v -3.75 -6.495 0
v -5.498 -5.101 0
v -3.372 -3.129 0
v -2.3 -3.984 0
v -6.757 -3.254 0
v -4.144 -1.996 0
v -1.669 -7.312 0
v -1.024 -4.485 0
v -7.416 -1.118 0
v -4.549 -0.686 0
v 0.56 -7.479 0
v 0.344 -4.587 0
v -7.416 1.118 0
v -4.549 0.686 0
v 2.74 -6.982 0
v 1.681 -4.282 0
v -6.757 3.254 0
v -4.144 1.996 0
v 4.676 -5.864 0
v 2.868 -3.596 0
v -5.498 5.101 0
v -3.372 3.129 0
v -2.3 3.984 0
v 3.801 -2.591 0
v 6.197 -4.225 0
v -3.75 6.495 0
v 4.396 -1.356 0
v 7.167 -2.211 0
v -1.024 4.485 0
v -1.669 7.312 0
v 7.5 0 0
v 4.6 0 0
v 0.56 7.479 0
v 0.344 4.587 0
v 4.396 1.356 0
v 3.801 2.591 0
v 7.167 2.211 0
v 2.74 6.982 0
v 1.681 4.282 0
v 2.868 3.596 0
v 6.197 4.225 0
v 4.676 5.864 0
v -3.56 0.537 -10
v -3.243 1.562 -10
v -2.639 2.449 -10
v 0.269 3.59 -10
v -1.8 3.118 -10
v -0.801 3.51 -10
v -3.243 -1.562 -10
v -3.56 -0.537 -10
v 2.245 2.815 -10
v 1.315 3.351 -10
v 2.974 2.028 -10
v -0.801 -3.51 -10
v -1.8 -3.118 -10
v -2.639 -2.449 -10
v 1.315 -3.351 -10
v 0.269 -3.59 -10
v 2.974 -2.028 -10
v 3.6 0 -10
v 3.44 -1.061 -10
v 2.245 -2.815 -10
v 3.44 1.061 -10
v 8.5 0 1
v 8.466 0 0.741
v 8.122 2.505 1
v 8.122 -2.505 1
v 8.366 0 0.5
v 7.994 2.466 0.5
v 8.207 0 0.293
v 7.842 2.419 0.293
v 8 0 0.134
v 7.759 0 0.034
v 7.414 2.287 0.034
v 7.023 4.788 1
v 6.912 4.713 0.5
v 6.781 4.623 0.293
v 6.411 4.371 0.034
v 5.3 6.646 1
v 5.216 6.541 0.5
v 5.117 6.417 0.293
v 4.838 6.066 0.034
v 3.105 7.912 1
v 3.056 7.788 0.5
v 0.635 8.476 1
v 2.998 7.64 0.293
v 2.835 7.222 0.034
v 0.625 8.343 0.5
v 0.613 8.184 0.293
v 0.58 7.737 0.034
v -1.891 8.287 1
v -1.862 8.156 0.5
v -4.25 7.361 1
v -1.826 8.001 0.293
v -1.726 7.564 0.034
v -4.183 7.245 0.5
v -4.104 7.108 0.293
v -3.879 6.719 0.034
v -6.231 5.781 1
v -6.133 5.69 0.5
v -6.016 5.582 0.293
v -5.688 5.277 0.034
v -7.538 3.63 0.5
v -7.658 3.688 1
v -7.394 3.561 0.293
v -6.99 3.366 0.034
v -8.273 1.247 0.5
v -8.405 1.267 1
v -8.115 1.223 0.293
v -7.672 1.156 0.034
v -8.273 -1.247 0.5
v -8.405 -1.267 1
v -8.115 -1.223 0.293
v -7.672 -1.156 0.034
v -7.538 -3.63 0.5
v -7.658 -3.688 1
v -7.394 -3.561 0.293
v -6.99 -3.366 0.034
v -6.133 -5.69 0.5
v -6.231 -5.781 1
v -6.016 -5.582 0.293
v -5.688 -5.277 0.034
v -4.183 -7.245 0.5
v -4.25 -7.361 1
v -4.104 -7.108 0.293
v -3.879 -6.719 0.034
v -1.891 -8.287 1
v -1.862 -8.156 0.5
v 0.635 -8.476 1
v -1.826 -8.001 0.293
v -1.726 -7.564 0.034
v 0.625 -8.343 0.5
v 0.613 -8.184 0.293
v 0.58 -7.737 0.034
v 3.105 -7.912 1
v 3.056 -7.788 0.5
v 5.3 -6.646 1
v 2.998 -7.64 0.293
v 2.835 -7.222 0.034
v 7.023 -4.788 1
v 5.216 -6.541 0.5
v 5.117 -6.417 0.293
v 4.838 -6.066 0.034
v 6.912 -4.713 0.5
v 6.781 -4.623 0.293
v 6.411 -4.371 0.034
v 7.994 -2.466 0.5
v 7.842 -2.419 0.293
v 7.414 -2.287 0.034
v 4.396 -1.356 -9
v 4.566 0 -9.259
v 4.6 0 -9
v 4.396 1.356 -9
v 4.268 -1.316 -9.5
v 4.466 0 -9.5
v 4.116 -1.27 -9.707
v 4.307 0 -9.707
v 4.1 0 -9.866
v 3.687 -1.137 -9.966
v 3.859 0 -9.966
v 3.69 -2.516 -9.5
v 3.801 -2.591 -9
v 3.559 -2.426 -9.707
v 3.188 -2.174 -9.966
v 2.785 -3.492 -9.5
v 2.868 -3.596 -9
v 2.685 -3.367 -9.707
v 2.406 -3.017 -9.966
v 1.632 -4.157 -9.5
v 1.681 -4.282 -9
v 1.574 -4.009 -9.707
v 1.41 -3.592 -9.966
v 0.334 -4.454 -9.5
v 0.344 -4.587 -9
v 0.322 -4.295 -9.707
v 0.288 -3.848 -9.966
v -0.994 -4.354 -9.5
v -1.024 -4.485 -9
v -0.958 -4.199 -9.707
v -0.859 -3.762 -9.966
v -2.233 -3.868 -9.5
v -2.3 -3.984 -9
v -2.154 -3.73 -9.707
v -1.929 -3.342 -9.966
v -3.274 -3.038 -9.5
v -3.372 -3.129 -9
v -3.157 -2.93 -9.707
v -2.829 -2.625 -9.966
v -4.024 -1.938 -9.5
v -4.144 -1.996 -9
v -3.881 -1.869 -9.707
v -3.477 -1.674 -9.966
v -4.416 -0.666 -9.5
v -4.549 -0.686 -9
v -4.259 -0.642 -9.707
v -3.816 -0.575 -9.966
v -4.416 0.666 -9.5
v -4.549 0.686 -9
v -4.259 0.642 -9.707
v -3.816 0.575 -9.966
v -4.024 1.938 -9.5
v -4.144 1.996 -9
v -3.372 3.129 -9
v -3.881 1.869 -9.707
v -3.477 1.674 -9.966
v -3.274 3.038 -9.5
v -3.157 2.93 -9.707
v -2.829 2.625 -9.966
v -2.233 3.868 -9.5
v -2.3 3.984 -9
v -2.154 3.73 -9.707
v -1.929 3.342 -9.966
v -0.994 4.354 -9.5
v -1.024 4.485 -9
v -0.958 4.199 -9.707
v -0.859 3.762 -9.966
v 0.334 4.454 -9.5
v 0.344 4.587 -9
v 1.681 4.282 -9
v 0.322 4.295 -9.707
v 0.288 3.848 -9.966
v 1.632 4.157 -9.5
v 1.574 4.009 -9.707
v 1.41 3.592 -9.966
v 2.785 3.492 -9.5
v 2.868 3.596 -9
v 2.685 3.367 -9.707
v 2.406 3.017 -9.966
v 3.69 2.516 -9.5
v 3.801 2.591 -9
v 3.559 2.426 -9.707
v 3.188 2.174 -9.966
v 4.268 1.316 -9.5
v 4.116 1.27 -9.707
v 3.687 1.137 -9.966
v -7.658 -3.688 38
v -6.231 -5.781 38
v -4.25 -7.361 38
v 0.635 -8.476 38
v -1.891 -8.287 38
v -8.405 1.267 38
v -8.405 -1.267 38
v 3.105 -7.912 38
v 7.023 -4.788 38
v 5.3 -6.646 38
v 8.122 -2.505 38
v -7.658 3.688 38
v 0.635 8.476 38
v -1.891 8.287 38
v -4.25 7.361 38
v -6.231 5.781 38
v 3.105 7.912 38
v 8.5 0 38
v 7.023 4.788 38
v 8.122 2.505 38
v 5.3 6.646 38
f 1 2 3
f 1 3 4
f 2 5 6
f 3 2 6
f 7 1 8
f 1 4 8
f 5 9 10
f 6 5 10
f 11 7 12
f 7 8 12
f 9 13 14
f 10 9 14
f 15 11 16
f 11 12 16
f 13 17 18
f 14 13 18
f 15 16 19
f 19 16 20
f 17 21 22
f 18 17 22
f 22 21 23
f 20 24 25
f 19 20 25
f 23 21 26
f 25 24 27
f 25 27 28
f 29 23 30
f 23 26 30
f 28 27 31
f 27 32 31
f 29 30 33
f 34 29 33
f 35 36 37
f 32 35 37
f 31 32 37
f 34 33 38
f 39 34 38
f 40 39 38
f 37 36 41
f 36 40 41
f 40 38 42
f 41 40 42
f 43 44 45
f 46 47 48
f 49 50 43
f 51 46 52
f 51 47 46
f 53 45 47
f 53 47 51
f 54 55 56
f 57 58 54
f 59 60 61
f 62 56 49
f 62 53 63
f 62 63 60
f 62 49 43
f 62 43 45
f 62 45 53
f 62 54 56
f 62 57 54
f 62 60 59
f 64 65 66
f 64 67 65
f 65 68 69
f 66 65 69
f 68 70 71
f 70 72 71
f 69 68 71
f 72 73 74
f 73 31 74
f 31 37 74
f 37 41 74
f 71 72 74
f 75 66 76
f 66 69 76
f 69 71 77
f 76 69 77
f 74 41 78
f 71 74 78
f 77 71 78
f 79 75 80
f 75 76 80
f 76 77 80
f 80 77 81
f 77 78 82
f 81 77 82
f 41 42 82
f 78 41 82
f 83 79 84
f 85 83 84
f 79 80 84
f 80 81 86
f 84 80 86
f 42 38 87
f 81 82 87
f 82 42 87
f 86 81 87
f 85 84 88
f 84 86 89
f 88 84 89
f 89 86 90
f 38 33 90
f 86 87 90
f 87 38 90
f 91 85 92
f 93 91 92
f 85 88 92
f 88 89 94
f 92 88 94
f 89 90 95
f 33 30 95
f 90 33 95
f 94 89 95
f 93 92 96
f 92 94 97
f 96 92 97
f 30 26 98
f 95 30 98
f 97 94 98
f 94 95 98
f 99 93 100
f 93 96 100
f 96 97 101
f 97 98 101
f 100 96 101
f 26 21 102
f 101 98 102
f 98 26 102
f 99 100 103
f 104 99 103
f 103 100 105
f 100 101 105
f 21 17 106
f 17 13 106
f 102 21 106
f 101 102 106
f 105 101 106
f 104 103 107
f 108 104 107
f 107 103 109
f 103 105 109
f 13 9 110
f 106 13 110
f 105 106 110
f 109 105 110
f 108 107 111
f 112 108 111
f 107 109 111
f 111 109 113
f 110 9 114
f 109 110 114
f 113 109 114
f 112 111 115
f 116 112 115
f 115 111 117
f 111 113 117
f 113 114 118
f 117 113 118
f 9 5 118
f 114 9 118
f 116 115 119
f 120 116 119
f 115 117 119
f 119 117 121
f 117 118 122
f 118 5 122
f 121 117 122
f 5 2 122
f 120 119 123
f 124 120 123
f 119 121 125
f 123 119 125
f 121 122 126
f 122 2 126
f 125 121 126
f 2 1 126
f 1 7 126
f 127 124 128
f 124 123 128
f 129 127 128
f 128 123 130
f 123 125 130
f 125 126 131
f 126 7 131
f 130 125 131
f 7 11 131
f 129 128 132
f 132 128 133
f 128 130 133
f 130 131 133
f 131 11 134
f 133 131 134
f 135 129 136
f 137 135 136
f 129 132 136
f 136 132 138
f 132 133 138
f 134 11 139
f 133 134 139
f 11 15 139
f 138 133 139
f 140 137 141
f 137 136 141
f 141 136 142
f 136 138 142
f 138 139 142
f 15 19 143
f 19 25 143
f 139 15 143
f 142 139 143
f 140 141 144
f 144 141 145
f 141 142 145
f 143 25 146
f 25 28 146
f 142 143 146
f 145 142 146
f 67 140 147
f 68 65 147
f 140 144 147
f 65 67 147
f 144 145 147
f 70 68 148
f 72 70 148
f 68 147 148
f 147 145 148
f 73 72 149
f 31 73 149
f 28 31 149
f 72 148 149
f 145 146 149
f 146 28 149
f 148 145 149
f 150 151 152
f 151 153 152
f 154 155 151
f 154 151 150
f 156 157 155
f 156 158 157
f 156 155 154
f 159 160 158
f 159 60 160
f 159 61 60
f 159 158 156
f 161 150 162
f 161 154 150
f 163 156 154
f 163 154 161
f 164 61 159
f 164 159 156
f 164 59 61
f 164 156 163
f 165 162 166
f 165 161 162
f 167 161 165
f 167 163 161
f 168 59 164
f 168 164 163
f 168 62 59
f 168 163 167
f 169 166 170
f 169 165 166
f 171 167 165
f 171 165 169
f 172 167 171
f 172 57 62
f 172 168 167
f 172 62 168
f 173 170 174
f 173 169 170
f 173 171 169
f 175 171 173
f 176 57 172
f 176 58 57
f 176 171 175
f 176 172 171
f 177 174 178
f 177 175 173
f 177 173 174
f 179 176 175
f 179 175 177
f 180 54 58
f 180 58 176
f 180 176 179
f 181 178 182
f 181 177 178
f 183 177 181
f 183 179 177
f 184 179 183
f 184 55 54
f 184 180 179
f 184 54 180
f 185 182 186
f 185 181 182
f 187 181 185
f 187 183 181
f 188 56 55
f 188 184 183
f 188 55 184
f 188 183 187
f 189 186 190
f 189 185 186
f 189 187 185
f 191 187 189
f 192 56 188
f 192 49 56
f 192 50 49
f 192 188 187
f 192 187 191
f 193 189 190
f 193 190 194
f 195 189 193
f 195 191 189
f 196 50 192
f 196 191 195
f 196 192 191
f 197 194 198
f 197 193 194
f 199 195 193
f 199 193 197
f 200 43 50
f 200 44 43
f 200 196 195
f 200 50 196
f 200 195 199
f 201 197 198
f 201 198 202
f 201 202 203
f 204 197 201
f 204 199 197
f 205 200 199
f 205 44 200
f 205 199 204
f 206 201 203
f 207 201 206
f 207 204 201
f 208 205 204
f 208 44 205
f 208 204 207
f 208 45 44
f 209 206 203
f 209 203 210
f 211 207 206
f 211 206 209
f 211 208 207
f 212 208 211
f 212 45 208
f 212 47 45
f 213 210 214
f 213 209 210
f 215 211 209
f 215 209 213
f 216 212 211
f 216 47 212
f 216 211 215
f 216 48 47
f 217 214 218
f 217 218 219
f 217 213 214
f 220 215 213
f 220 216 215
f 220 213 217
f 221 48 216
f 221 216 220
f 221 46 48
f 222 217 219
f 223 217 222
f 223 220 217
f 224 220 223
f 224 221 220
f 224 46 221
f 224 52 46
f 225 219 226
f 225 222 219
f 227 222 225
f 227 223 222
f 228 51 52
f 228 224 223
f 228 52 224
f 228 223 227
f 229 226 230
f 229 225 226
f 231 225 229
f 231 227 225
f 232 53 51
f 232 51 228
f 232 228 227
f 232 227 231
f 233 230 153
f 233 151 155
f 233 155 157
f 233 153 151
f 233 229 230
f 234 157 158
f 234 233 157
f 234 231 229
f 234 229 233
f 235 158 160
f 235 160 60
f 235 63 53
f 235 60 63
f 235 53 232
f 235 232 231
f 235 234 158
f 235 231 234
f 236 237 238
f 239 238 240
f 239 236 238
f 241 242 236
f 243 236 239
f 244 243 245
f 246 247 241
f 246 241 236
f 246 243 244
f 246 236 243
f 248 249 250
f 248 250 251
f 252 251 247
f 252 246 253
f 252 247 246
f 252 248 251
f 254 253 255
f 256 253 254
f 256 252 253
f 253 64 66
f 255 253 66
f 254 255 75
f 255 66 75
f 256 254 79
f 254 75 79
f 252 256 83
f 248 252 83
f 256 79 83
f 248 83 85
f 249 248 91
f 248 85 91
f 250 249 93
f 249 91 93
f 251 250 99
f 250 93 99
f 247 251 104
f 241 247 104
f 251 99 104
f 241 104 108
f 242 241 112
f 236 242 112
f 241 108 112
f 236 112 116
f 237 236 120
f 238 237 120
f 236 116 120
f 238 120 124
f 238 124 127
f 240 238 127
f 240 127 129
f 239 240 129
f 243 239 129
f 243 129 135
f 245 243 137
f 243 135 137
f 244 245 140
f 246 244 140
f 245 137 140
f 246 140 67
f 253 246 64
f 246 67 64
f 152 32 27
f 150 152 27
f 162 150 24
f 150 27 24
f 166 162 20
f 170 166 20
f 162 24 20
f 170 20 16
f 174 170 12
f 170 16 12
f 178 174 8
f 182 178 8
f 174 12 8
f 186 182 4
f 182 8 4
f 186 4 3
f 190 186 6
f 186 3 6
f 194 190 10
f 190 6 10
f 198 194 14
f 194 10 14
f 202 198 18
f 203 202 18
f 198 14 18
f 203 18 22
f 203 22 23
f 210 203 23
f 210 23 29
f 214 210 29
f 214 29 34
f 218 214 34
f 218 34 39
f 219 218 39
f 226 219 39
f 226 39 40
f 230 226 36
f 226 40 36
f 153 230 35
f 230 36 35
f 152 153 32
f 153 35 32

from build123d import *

# Parameters (mm, degrees)
SKETCH_R     = 8.5
PAD_DEPTH    = 38
SKETCH001_R  = 4.6
PAD001_DEPTH = 10
FILLET_R     = 1


with BuildPart() as part:
    # Sketch → Pad (new body)
    with BuildSketch(Plane.XY):
        Circle(SKETCH_R)
    extrude(amount=PAD_DEPTH)

    # Sketch001 (on Face2 of Pad) → Pad001 (join)
    with BuildSketch(Plane(origin=(0, 0, 0), x_dir=(1, 0, 0), z_dir=(0, 0, -1))):
        Circle(SKETCH001_R)
    extrude(amount=PAD001_DEPTH)

    # Fillet
    fillet_edges = [part.edges().sort_by_distance(p)[0] for p in [
        (-4.6, 0, -10),
        (-8.5, 0, 0),
    ]]
    fillet(fillet_edges, radius=FILLET_R)


solid = part.part
